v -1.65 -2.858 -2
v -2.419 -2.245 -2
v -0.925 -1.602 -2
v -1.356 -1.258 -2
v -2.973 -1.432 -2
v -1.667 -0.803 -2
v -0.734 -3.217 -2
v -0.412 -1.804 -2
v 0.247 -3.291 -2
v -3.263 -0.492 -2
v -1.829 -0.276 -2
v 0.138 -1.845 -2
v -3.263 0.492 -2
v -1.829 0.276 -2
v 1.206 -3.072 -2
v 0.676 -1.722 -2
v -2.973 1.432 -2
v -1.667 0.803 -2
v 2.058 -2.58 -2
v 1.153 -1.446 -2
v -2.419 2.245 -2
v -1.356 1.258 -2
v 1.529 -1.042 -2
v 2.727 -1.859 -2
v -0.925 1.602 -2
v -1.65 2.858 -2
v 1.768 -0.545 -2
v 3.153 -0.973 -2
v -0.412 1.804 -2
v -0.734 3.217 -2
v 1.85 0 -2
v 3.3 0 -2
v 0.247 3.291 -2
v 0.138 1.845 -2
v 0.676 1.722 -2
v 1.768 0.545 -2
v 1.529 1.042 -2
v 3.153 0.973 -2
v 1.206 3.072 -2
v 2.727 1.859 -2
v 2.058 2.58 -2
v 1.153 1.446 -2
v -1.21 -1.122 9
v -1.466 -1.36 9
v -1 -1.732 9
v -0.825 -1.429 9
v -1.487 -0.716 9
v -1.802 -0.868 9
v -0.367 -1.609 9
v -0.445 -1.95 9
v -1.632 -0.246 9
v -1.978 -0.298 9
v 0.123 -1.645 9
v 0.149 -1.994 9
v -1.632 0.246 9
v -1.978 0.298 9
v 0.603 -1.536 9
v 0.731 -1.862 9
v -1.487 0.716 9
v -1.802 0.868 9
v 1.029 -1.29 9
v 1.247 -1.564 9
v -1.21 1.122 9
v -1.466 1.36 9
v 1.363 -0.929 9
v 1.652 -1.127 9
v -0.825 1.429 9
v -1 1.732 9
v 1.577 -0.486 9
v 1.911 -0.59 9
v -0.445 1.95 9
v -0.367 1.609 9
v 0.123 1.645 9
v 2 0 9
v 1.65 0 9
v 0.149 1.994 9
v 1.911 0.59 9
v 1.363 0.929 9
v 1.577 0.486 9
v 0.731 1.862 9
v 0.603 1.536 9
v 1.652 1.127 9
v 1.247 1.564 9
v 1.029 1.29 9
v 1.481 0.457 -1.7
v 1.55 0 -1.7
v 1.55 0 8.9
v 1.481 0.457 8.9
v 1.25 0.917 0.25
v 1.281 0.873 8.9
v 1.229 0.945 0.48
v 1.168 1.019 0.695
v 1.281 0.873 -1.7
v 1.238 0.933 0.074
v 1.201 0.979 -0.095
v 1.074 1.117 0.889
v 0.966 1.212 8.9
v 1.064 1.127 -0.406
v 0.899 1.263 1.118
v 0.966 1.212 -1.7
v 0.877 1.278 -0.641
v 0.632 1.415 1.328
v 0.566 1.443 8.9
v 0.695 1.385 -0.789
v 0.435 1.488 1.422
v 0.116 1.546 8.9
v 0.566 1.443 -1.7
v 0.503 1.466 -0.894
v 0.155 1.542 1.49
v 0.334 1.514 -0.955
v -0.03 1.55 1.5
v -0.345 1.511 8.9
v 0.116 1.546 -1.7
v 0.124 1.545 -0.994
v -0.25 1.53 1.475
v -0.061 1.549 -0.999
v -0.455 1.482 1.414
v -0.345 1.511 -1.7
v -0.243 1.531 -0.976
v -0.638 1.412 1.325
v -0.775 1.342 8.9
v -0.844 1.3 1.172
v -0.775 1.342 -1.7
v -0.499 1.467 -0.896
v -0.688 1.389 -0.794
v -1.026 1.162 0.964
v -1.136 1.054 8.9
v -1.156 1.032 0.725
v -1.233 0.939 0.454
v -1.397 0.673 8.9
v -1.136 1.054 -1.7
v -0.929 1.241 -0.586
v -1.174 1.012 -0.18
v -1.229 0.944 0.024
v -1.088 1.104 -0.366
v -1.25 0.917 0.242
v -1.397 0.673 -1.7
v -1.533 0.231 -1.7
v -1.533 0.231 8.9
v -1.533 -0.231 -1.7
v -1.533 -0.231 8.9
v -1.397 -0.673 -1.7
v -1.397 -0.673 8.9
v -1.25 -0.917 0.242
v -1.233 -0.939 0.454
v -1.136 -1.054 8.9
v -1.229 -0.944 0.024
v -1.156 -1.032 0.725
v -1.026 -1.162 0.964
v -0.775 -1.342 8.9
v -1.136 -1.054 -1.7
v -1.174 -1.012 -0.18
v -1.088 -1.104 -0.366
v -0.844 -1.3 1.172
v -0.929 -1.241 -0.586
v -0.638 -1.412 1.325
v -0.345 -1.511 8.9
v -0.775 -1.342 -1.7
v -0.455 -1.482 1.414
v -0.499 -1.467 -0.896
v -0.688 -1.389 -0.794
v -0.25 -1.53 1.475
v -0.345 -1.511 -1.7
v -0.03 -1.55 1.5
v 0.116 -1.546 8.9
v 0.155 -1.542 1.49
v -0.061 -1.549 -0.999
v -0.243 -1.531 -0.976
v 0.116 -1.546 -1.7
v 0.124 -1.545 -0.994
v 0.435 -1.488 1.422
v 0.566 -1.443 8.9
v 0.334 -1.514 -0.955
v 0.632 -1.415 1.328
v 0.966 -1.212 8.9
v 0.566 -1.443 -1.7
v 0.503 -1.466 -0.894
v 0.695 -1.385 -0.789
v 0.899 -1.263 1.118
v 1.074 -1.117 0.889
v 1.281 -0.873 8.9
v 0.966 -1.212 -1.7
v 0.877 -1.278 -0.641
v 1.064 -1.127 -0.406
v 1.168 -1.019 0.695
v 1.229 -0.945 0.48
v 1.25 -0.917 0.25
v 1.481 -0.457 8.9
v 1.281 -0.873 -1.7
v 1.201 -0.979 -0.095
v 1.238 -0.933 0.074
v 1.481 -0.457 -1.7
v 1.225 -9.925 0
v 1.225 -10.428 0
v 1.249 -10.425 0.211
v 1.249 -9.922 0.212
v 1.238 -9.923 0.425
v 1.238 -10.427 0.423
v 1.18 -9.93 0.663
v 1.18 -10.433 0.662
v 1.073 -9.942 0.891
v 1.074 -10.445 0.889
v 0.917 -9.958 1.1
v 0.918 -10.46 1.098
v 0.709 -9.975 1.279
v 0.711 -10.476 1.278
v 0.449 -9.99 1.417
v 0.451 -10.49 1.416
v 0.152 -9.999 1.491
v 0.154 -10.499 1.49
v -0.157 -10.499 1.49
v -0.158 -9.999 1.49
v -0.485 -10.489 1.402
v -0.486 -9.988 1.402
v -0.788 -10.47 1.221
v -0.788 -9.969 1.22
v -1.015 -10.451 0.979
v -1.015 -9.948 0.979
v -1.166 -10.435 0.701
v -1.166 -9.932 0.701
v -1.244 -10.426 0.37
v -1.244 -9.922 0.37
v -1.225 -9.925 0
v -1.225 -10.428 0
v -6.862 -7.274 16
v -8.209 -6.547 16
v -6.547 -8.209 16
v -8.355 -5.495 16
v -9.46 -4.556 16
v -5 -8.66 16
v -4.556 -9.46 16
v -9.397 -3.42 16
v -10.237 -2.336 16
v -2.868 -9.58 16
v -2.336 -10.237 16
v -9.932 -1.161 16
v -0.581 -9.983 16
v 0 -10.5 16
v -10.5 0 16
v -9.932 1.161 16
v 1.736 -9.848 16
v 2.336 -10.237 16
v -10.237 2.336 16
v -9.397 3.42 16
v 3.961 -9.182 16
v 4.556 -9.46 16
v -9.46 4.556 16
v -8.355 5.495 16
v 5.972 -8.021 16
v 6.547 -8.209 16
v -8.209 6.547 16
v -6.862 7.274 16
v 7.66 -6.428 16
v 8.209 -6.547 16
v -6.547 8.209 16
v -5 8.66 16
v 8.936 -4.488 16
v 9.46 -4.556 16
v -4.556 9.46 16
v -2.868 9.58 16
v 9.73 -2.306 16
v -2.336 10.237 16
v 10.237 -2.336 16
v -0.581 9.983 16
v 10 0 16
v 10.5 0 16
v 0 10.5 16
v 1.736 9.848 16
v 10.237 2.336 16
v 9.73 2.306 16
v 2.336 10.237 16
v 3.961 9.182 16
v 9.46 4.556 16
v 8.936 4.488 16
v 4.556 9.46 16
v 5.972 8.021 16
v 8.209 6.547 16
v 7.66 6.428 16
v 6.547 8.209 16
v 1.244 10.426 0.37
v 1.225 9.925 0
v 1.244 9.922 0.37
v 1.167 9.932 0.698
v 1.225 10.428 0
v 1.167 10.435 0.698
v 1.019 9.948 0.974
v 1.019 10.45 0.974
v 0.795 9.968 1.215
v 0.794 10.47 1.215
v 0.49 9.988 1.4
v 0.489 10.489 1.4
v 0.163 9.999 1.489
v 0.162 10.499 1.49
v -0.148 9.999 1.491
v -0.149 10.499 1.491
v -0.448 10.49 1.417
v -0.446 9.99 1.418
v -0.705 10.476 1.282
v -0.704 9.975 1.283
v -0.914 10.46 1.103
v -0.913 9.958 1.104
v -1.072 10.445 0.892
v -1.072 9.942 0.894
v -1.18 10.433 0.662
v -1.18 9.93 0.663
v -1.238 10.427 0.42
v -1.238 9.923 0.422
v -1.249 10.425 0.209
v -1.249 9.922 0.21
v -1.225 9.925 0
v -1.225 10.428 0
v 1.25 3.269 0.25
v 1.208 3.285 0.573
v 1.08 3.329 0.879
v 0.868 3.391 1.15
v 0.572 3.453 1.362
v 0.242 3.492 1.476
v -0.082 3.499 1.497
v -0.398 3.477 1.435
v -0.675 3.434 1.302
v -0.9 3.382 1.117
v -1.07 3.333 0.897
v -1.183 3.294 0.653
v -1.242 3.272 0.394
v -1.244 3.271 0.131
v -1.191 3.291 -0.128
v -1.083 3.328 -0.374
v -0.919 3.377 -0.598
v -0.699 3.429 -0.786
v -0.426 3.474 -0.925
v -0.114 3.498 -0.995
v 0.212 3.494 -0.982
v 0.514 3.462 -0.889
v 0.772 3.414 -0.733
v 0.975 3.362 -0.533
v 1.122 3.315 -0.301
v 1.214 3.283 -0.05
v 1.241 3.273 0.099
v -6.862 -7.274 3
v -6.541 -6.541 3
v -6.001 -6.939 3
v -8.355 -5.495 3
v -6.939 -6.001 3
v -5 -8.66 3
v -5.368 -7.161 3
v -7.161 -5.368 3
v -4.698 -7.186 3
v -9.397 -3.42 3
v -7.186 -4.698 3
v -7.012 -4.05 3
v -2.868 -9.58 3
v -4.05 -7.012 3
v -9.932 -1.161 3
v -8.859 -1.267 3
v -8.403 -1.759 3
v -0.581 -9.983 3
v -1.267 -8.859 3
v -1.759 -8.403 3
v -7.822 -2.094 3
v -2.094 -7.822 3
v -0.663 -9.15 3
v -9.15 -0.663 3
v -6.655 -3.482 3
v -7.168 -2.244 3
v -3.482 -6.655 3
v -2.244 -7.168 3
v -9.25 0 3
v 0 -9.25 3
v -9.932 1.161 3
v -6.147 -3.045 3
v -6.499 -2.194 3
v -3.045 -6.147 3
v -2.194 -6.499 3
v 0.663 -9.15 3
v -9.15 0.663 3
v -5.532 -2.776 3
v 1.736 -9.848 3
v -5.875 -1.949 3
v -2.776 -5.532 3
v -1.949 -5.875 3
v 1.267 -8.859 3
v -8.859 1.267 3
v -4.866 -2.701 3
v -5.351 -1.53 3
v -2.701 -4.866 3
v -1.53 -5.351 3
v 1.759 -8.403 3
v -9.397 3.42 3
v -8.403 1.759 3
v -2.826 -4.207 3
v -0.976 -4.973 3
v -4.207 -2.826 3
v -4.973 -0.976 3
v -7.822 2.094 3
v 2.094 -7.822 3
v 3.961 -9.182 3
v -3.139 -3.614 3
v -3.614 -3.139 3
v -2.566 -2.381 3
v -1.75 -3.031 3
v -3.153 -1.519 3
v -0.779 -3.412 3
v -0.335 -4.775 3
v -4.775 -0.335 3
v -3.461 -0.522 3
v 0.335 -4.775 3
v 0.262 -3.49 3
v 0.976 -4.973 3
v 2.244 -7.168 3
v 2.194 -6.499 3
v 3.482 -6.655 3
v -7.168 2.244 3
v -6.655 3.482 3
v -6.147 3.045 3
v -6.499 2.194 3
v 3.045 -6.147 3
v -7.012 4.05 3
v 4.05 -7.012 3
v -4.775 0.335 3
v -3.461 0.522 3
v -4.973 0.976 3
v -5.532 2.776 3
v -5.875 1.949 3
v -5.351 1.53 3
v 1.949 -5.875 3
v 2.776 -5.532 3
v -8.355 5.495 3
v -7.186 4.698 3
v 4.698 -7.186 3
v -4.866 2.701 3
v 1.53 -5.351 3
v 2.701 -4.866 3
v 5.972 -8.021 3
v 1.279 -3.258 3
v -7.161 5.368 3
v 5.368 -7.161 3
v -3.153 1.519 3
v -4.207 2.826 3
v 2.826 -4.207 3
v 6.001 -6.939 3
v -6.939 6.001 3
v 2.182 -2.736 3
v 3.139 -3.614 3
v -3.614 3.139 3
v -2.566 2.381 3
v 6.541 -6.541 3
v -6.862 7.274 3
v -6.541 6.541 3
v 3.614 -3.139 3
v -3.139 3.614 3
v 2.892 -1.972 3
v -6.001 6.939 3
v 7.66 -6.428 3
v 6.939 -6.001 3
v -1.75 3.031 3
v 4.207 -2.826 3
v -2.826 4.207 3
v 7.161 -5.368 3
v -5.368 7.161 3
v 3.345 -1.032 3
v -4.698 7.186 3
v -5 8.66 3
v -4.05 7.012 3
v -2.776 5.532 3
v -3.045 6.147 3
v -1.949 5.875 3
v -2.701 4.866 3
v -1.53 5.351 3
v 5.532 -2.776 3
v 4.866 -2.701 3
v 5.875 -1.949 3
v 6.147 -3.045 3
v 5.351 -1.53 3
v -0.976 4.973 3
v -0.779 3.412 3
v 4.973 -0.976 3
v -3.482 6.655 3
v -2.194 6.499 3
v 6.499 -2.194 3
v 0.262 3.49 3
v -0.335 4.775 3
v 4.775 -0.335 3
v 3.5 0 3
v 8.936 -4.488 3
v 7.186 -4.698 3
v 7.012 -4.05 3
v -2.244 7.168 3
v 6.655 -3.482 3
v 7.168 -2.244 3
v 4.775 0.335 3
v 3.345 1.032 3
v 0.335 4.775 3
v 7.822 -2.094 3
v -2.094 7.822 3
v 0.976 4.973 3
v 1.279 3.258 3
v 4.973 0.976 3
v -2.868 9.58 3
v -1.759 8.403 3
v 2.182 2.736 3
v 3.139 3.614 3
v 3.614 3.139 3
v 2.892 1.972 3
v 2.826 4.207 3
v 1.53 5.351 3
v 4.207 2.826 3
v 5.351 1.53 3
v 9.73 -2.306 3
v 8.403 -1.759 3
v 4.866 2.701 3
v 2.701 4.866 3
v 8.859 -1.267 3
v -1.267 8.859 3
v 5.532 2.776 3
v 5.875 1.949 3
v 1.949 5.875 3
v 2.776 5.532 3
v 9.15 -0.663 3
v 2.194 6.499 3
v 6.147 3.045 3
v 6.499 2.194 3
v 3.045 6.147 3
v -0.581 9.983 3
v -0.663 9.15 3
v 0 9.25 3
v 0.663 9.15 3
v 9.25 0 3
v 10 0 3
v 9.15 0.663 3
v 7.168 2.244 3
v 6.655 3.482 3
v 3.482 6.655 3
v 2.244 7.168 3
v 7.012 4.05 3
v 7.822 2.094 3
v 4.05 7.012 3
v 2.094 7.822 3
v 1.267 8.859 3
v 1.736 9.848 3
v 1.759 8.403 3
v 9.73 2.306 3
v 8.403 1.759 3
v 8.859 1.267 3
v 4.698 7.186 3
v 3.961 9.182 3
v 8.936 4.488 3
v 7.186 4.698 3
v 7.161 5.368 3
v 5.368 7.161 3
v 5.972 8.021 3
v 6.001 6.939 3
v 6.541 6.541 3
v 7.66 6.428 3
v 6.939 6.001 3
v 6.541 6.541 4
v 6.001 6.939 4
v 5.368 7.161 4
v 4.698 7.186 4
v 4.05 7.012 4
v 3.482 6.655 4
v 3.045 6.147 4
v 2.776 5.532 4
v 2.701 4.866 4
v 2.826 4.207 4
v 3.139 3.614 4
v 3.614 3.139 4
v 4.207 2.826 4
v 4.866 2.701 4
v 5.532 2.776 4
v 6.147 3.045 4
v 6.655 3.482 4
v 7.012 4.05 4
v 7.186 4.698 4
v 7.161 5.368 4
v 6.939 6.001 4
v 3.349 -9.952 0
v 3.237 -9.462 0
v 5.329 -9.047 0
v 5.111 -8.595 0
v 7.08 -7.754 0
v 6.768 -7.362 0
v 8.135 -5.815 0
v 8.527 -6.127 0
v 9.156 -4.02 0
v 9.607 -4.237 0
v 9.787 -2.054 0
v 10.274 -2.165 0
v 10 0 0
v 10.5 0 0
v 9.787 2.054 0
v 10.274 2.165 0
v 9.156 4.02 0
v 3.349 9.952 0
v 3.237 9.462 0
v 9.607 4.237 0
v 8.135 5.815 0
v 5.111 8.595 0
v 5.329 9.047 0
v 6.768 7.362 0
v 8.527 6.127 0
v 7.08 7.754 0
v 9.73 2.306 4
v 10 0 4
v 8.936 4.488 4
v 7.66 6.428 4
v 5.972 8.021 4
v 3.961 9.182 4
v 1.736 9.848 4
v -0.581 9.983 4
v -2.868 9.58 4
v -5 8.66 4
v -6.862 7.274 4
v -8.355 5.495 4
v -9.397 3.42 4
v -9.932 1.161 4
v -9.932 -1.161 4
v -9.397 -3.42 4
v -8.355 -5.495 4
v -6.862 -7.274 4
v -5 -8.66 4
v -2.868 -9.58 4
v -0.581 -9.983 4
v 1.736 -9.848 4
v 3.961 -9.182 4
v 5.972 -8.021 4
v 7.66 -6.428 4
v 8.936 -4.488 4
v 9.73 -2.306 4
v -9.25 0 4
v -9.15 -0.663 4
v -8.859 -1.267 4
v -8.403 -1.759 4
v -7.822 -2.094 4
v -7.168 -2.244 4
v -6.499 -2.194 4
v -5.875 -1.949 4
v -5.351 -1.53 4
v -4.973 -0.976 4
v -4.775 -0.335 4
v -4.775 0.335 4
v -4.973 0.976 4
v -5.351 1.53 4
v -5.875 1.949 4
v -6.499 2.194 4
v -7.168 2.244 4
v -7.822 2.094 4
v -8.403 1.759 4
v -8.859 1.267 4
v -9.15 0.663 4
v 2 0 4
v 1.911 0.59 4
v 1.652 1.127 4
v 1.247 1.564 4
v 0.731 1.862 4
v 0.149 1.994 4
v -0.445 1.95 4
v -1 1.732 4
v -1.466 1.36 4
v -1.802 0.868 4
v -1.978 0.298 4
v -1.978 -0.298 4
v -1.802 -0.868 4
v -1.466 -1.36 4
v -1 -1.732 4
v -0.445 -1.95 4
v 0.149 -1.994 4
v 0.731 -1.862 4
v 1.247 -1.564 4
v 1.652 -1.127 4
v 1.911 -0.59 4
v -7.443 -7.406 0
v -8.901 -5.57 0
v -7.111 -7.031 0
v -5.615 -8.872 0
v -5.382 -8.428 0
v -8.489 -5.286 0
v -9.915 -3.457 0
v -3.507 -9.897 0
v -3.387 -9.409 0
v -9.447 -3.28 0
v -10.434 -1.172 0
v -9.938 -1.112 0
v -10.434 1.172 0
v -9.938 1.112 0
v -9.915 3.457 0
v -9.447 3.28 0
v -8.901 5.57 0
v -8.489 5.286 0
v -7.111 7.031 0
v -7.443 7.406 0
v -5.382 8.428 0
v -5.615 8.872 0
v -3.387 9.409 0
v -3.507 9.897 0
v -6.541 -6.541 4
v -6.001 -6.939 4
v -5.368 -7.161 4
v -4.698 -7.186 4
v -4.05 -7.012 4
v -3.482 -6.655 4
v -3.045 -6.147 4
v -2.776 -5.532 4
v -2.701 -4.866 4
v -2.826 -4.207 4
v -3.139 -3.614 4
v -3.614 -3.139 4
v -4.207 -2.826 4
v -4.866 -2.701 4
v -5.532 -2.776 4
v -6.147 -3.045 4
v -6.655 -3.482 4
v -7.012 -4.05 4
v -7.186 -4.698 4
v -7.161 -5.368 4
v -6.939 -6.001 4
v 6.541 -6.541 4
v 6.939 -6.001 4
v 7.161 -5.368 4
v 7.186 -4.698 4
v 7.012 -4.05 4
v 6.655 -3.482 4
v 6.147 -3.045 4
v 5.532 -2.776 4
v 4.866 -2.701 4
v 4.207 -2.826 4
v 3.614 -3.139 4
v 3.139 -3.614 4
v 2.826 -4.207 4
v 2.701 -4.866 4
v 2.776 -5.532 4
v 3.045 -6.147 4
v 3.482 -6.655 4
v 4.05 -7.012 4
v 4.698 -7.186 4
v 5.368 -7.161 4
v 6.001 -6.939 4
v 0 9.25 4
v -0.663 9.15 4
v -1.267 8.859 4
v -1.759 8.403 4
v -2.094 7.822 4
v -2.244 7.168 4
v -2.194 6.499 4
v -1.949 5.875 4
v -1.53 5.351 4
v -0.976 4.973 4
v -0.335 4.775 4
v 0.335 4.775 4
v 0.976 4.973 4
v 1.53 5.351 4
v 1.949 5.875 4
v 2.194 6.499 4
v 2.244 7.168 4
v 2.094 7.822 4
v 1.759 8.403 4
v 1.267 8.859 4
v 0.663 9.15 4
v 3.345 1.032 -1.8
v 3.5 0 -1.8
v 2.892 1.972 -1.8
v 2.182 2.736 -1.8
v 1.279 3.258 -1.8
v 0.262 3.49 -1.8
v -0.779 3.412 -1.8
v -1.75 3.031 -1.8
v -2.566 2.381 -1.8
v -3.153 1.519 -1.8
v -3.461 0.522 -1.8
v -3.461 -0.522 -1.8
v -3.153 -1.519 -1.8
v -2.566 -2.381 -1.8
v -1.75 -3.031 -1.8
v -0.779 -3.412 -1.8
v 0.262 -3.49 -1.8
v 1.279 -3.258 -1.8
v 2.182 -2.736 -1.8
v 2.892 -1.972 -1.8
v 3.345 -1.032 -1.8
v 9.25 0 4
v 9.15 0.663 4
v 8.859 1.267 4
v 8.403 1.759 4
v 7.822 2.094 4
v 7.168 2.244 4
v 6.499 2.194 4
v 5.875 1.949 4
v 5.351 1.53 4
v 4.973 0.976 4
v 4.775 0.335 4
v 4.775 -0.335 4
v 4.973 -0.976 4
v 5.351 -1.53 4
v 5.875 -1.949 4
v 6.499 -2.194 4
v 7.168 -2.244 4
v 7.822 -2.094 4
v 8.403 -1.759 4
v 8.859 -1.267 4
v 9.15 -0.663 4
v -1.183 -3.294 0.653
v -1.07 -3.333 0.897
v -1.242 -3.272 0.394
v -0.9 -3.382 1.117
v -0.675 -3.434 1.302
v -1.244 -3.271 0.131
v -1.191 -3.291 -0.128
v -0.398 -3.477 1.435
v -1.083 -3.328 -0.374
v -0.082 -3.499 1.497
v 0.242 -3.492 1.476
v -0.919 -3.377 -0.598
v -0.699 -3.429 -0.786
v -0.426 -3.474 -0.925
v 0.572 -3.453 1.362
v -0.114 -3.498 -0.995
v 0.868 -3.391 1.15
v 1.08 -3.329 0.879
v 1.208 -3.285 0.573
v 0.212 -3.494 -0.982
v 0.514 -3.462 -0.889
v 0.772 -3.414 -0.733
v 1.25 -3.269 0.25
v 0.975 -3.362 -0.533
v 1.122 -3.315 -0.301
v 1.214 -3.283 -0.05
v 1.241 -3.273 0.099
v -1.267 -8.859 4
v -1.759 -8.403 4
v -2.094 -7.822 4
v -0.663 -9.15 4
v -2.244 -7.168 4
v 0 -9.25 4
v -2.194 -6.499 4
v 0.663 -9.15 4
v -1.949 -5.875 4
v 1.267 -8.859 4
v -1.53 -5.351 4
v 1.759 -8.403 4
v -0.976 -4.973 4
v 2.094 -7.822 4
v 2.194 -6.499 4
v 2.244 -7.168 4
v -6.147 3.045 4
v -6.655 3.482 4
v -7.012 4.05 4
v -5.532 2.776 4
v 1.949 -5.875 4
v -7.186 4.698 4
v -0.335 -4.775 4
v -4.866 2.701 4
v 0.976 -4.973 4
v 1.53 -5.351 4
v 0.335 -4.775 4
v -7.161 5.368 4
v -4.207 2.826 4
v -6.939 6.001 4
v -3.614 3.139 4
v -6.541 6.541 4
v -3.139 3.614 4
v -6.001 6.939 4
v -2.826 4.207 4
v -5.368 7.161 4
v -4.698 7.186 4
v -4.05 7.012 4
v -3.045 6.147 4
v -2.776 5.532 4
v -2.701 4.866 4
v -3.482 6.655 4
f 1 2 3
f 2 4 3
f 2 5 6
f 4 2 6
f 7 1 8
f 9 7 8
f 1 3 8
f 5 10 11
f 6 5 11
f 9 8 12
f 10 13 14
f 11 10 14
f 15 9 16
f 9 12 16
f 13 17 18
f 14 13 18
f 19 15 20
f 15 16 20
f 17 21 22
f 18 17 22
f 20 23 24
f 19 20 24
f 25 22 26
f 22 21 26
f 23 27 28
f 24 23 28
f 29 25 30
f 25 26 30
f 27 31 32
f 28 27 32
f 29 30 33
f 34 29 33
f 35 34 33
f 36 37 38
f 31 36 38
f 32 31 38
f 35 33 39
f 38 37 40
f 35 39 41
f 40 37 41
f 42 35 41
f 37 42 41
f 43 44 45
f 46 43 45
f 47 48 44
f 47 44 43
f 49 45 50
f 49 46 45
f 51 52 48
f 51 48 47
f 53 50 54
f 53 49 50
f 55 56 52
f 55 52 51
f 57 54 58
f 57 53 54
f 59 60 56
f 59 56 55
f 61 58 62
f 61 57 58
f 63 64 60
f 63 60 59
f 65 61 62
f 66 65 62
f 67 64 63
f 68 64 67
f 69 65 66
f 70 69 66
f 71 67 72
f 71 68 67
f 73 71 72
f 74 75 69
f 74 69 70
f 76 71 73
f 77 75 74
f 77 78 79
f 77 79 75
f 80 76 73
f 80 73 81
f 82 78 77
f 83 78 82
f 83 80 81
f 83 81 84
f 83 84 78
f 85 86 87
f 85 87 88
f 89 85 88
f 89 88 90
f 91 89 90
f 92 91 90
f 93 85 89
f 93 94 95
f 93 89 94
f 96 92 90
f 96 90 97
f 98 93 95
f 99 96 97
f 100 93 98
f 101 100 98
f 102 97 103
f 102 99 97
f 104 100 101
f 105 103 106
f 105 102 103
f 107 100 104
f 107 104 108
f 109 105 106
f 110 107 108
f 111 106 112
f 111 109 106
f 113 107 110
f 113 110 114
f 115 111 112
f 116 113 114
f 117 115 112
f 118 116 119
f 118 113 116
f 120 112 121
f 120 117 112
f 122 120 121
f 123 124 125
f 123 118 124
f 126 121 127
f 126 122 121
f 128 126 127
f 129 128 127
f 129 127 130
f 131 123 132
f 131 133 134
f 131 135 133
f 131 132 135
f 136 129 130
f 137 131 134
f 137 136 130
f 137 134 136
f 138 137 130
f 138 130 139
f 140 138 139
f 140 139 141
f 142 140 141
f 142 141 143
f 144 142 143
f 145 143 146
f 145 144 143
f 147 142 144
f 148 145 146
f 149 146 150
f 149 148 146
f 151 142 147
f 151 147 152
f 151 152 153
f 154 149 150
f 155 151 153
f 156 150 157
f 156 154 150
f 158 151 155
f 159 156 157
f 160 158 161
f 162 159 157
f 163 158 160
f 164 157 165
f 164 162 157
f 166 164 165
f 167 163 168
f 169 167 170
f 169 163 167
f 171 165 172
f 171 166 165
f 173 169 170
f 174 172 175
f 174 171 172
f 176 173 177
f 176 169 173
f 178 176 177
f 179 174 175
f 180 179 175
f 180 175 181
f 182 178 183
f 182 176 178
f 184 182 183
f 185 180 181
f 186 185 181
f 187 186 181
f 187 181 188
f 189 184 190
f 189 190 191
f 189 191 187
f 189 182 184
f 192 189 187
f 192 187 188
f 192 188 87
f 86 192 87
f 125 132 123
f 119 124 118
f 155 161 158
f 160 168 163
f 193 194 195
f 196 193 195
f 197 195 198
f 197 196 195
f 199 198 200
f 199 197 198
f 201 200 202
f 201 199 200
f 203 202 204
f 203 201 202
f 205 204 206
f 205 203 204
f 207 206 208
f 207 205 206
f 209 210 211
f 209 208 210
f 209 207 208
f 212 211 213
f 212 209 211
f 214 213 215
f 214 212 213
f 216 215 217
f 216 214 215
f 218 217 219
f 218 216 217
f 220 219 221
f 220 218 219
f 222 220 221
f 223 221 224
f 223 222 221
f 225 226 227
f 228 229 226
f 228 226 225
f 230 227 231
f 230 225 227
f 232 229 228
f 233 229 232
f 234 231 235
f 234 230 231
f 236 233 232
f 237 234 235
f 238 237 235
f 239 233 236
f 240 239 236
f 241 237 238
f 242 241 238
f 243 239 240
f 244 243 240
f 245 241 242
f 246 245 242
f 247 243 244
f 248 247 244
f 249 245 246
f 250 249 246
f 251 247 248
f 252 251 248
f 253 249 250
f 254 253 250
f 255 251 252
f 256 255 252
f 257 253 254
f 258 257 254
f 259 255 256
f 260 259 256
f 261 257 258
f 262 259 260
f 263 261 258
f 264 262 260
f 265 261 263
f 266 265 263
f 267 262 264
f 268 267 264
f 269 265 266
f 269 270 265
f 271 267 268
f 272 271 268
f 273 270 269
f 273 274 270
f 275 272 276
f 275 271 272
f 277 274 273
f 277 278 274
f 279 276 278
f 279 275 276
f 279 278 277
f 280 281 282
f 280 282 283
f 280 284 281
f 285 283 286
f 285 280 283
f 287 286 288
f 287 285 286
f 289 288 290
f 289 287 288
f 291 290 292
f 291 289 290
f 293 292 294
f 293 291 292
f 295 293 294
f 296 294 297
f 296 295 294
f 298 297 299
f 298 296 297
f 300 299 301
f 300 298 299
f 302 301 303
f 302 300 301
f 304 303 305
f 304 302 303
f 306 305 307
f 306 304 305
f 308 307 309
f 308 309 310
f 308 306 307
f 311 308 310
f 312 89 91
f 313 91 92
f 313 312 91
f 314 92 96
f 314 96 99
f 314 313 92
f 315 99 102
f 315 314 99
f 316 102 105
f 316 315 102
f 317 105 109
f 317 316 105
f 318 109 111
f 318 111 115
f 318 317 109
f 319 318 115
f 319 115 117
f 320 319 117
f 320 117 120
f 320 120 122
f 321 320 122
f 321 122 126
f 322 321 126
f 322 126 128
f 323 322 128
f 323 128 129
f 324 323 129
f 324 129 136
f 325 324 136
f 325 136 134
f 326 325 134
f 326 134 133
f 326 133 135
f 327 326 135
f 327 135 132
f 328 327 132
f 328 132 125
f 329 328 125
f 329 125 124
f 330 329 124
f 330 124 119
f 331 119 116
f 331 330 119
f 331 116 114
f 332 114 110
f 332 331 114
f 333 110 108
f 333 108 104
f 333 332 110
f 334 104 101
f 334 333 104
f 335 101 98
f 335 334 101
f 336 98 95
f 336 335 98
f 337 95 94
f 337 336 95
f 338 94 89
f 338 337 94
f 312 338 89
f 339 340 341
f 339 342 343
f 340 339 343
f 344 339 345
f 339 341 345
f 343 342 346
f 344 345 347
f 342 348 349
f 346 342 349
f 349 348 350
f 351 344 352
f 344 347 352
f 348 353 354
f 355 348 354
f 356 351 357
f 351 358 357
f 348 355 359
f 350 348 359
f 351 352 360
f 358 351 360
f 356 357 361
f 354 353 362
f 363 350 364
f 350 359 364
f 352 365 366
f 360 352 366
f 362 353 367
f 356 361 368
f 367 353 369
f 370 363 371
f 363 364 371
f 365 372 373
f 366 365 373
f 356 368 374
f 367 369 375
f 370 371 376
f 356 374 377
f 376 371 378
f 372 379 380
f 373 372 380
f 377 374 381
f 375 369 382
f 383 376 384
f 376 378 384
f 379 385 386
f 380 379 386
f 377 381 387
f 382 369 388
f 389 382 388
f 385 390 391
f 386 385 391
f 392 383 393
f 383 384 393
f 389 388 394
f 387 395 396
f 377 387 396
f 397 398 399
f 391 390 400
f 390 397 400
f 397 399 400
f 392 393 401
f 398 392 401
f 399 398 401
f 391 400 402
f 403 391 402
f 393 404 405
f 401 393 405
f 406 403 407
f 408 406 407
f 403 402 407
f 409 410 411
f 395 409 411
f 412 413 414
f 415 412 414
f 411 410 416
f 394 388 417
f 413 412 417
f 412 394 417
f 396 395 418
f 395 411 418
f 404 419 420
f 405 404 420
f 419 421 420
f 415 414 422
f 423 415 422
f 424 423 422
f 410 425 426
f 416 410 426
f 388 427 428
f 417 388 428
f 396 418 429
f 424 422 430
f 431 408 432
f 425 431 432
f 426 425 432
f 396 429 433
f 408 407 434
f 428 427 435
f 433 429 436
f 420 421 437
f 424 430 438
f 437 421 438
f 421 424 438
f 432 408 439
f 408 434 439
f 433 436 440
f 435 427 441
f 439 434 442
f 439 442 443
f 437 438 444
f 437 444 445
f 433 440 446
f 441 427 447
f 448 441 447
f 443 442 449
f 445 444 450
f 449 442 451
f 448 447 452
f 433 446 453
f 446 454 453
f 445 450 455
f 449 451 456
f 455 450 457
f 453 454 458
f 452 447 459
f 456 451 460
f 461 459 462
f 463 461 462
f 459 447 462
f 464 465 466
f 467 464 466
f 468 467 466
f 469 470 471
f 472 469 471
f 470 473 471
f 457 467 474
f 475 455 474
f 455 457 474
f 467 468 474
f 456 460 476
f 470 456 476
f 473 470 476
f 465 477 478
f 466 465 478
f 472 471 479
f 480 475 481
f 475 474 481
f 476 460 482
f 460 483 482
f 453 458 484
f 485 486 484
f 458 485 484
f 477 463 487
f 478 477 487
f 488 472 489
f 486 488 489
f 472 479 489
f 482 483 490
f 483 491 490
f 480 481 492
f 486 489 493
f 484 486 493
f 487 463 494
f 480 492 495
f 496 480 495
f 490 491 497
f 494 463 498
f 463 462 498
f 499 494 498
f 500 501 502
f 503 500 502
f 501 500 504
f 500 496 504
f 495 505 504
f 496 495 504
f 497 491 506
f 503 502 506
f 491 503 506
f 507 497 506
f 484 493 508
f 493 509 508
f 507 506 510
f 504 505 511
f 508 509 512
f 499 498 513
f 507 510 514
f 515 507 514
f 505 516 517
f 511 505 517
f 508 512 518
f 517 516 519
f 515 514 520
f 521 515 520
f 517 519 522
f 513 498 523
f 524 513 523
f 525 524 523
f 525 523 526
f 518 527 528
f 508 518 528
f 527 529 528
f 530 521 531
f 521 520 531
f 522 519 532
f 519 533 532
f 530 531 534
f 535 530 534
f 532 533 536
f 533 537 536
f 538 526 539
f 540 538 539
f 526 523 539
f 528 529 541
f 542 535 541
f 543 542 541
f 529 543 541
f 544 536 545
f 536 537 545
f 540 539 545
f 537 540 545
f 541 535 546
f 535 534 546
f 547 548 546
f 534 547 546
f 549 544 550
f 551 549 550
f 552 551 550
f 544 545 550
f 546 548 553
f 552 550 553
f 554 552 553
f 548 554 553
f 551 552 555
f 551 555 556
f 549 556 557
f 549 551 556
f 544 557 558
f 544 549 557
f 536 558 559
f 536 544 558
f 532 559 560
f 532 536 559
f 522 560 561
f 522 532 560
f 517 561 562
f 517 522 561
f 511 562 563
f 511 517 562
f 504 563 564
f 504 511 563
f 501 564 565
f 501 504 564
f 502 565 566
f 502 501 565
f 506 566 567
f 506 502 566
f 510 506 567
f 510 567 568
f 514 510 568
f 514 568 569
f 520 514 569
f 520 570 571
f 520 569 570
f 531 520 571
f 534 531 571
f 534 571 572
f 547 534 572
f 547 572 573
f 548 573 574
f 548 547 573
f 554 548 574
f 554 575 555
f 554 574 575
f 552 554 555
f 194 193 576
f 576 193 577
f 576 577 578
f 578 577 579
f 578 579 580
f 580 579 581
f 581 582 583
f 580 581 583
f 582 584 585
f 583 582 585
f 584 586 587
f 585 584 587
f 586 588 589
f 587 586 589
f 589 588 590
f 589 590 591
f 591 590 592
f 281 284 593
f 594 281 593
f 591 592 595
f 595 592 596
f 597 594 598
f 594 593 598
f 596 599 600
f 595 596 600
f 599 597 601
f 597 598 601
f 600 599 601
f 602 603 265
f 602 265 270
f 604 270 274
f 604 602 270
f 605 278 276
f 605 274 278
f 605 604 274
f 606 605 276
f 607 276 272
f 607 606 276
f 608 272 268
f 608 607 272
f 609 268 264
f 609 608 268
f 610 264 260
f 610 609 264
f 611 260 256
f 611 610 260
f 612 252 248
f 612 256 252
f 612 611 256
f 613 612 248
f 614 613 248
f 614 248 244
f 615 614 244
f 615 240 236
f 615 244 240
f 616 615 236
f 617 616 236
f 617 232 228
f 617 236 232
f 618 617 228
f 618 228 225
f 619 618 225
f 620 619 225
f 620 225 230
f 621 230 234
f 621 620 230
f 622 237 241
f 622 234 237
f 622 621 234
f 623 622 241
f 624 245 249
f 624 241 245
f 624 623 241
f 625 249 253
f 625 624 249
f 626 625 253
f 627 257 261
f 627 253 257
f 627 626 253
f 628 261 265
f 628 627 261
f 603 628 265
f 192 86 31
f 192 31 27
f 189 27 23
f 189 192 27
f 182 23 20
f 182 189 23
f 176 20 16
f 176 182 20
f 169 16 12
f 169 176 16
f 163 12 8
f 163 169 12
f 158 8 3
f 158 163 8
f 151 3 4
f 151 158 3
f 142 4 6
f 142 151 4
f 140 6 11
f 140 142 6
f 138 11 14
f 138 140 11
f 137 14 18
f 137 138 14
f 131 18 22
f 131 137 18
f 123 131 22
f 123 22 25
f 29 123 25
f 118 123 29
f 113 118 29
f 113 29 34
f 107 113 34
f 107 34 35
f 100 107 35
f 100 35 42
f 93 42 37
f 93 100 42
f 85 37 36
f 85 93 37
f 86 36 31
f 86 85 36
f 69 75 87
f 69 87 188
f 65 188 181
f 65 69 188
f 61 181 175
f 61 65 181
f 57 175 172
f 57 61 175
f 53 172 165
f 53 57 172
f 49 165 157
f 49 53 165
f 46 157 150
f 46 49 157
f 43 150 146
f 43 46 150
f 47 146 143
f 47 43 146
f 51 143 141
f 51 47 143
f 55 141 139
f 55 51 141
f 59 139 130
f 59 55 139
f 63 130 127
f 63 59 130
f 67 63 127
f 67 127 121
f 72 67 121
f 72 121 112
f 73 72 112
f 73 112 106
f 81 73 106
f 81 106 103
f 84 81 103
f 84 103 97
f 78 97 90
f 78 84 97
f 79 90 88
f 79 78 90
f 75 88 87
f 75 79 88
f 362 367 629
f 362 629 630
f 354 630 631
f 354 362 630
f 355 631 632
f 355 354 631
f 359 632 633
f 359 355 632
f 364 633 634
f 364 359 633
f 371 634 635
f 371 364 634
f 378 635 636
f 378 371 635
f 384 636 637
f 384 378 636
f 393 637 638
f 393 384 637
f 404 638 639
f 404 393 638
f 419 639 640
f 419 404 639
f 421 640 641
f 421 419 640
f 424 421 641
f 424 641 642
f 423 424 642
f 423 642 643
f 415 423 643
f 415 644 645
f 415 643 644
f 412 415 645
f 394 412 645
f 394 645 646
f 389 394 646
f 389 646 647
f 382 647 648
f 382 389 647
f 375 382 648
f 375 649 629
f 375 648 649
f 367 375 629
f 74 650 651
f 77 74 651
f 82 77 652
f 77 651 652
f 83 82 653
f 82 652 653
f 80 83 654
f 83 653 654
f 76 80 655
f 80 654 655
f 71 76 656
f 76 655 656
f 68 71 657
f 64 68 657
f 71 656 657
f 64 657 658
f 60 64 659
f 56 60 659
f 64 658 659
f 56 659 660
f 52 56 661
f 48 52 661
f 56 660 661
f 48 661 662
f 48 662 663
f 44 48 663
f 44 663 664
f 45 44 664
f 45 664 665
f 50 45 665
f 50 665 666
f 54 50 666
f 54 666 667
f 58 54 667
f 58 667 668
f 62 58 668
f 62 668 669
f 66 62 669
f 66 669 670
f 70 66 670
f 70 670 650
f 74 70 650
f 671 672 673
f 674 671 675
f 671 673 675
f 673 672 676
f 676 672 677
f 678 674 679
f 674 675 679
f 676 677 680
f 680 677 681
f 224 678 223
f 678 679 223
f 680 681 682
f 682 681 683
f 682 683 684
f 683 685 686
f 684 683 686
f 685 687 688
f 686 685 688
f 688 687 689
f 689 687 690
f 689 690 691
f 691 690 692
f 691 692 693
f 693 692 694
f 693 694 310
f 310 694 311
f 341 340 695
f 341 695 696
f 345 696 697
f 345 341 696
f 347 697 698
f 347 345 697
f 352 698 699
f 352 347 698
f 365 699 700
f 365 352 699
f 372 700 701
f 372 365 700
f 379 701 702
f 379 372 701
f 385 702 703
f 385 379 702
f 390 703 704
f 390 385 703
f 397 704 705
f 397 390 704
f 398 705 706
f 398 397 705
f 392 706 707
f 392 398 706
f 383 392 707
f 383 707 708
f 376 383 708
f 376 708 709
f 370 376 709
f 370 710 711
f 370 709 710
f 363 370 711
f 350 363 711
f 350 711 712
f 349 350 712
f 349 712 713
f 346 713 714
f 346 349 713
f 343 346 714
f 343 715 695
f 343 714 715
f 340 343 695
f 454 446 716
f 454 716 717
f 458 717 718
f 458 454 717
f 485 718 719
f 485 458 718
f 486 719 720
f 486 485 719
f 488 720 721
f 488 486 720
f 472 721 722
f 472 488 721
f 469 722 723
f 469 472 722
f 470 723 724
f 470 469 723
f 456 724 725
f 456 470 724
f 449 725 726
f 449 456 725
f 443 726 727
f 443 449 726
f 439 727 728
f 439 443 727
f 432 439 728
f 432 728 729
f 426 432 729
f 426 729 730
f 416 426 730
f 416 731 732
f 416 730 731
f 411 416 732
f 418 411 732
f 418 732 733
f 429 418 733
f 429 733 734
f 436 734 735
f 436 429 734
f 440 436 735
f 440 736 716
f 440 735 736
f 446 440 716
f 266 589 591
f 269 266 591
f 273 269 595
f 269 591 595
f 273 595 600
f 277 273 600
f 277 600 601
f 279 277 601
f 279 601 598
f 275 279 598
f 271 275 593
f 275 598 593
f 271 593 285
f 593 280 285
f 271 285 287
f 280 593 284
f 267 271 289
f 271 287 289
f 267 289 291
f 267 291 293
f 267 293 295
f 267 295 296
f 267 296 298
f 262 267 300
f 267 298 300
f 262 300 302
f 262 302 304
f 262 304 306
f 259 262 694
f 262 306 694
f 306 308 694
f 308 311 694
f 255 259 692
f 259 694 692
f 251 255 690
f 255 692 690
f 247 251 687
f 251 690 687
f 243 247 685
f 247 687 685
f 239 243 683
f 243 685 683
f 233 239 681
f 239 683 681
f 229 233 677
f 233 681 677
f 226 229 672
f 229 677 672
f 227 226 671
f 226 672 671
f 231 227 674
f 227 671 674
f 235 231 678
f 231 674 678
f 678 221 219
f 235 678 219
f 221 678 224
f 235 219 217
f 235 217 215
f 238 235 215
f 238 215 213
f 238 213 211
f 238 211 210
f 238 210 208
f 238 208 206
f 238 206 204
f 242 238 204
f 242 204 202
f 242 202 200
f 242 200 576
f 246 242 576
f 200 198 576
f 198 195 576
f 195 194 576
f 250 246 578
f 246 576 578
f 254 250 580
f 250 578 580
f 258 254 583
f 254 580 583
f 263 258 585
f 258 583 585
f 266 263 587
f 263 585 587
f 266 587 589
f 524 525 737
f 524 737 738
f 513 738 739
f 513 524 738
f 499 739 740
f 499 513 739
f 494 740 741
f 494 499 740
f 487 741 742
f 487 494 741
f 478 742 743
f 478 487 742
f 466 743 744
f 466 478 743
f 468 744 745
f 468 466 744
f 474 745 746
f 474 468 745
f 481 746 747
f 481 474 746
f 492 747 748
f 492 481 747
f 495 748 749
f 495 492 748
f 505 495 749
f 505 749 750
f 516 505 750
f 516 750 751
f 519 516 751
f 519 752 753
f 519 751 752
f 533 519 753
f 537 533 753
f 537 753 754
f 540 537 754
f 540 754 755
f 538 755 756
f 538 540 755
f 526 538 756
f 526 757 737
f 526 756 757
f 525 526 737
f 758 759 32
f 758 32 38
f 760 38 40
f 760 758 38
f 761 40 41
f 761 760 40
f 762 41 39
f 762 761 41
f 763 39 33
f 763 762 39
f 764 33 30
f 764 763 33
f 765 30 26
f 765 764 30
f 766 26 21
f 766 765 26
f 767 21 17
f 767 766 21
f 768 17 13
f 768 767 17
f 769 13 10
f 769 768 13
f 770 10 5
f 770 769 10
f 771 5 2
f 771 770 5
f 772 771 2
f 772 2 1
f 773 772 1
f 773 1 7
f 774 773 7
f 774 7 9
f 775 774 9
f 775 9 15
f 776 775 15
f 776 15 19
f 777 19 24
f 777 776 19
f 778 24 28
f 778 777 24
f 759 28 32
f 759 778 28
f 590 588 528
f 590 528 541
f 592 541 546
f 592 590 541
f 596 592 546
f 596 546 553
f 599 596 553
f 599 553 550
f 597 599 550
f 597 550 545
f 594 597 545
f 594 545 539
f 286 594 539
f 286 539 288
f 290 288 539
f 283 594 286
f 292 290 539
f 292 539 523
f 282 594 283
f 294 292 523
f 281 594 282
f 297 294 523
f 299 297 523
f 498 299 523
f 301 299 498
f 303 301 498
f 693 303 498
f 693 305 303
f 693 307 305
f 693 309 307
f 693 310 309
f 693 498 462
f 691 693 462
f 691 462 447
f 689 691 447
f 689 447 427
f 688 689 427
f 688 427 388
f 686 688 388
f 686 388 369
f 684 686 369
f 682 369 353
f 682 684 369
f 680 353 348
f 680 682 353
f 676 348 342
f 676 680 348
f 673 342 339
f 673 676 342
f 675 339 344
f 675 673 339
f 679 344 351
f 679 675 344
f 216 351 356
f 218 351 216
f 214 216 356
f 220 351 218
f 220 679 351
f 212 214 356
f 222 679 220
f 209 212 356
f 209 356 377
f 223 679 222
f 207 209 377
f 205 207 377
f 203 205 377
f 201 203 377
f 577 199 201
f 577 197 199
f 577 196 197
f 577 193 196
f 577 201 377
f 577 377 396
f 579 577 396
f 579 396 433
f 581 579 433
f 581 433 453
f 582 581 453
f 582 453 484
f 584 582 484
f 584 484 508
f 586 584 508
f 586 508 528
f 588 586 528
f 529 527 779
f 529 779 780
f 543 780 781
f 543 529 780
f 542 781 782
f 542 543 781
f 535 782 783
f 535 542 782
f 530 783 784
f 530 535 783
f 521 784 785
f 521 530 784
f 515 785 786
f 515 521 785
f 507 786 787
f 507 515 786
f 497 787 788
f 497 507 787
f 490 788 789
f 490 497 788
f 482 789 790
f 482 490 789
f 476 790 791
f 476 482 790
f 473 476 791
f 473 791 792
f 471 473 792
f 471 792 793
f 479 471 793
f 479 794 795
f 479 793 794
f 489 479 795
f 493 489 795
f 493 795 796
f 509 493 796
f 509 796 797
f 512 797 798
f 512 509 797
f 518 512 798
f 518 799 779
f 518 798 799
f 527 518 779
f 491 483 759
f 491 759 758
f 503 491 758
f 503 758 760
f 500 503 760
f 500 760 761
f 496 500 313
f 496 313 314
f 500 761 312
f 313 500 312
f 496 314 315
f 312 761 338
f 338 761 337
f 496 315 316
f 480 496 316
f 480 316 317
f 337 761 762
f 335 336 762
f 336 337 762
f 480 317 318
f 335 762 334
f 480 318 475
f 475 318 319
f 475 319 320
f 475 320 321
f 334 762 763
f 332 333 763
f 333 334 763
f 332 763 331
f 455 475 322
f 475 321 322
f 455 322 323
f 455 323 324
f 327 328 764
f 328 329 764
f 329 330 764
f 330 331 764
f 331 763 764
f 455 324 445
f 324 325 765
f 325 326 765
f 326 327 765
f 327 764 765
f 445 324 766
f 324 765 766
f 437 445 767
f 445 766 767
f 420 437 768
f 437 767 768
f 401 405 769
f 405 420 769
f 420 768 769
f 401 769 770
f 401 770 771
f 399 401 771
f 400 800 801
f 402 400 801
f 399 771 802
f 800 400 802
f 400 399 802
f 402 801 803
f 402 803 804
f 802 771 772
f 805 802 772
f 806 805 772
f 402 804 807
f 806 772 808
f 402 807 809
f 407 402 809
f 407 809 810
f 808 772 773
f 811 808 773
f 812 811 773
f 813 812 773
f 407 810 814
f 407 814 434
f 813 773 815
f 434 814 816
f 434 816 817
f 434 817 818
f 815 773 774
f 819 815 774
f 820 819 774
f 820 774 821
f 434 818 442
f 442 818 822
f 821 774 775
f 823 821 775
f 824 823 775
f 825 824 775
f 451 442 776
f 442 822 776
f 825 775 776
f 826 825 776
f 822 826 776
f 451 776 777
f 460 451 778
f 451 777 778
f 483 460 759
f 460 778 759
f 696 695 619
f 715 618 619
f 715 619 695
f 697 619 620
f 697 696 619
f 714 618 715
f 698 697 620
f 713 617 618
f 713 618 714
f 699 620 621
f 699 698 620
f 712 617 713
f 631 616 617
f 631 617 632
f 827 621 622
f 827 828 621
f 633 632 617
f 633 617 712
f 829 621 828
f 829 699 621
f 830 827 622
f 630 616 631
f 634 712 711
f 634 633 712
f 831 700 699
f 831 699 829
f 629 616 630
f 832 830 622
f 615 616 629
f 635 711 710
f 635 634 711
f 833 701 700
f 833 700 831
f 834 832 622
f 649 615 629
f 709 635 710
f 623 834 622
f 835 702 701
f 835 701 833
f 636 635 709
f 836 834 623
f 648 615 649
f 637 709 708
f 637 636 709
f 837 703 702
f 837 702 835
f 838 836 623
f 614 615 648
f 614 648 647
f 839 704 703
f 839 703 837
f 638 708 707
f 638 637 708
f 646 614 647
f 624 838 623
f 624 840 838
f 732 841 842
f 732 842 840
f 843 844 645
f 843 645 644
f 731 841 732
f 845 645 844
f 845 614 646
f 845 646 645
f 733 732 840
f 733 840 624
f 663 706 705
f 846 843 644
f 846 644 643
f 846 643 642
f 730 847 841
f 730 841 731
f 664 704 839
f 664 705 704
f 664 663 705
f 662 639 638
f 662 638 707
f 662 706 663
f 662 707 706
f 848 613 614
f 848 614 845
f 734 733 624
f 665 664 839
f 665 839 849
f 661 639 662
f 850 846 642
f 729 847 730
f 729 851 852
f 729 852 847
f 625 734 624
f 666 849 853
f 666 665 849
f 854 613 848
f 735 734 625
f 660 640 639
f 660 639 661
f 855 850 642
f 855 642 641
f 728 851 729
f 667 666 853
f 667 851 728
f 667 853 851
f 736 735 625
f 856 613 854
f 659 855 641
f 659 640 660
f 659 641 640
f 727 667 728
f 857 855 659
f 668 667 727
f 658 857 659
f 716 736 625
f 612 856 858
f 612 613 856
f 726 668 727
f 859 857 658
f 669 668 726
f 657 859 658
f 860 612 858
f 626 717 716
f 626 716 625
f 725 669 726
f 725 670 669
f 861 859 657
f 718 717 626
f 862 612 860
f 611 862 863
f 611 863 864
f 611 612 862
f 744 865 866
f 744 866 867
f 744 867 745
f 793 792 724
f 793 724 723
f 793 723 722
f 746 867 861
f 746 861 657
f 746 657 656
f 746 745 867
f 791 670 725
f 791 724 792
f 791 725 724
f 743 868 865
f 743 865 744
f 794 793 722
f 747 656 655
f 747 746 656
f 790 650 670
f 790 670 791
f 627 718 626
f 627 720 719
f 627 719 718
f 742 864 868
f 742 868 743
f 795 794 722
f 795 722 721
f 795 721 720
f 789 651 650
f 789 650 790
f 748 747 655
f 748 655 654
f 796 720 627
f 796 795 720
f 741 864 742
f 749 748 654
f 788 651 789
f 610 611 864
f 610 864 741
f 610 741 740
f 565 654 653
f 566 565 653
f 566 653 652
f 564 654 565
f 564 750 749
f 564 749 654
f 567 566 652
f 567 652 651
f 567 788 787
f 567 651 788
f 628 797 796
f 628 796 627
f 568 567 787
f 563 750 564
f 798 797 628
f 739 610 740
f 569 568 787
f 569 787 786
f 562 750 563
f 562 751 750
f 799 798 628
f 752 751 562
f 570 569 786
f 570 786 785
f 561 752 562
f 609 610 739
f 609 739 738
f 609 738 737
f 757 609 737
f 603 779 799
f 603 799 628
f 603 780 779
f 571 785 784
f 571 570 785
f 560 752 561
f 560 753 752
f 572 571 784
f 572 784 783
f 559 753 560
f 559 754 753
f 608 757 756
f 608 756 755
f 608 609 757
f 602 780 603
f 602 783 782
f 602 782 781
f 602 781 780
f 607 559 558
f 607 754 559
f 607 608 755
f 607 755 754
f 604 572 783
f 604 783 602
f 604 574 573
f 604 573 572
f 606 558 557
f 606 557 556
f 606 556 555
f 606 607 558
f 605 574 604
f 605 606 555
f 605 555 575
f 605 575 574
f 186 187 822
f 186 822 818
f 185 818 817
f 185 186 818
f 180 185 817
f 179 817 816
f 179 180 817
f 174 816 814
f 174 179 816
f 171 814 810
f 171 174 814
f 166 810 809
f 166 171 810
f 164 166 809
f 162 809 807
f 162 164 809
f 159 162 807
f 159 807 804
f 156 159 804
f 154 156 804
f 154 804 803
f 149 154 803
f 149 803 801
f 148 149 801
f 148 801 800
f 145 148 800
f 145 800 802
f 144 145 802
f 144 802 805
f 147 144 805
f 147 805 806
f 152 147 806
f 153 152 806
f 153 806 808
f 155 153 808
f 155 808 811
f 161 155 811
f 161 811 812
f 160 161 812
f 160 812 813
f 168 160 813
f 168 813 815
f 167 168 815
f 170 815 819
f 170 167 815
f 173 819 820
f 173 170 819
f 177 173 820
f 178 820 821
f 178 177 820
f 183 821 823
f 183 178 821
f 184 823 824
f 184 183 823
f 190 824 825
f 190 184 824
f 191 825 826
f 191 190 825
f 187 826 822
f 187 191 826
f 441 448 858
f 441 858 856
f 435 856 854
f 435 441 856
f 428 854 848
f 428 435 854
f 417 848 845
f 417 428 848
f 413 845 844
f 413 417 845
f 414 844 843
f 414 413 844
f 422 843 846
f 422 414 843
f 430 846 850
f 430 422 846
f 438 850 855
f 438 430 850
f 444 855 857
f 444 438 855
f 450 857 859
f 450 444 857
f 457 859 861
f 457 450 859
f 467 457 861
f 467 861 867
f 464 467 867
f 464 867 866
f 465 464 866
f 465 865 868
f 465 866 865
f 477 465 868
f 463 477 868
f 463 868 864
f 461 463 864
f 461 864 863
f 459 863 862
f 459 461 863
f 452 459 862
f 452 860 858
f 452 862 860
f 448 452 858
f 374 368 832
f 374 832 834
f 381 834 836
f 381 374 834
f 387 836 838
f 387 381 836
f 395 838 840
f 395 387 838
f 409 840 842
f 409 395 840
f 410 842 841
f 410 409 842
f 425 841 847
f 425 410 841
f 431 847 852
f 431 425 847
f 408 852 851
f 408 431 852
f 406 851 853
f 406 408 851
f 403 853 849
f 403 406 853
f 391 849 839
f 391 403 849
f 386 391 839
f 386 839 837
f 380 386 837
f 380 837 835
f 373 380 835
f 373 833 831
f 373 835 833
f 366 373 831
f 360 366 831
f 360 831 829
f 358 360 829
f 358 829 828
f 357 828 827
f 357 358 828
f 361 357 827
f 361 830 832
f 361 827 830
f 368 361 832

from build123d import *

# Parameters (mm, degrees)
CYLINDER039_R          = 2.25
CYLINDER039_DEPTH      = 30
ARRAY002_COUNT         = 8
CYLINDER038_R          = 1.55
CYLINDER038_DEPTH      = 30
CYLINDER045_R          = 1.25
CYLINDER045_DEPTH      = 32
CYLINDER045_ROLL_ANGLE = 90
CYLINDER043_R          = 3.5
CYLINDER043_DEPTH      = 5.5
CYLINDER042_R          = 10
CYLINDER042_DEPTH      = 16
CYLINDER037_R          = 10
CYLINDER037_DEPTH      = 16
CYLINDER036_R          = 10.5
CYLINDER036_DEPTH      = 16
CYLINDER044_R          = 2
CYLINDER044_DEPTH      = 5.5
CHAMFER062_1_SIZE      = 0.3
CHAMFER062_2_SIZE      = 0.2
CHAMFER062_3_SIZE      = 0.1


with BuildPart() as array002:
    # Cylinder039 → Cylinder039 (new body)
    with BuildSketch(Plane(origin=(7, 0, -10), x_dir=(1, 0, 0), z_dir=(0, 0, 1))):
        Circle(CYLINDER039_R)
    extrude(amount=CYLINDER039_DEPTH)

    # Array002: Array002 ×8 about axis
    array002_axis = Axis((0, 0, 0), (0, 0, 1))


with BuildPart() as array002_1:
    add(array002.part)
    for i in range(1, ARRAY002_COUNT):
        add(array002.part.rotate(array002_axis, i * 360 / ARRAY002_COUNT))


with BuildPart() as fusion033:
    # Cylinder038 → Cylinder038 (new body)
    with BuildSketch(Plane.XY.offset(-10)):
        Circle(CYLINDER038_R)
    extrude(amount=CYLINDER038_DEPTH)

    # Fusion033: union Array002
    add(array002_1.part)


with BuildPart() as cylinder045:
    # Cylinder045 → Cylinder045 (new body)
    with BuildSketch(Plane.XY):
        Circle(CYLINDER045_R)
    extrude(amount=CYLINDER045_DEPTH)


with BuildPart() as cylinder045_1:
    # Cylinder045 roll: moved
    add(cylinder045.part.rotate(Axis((0, 0, 0), (1, 0, 0)), CYLINDER045_ROLL_ANGLE))


with BuildPart() as cylinder045_2:
    # Cylinder045 placement: moved
    add(cylinder045_1.part.moved(Location((0, 15, 0.25))))


with BuildPart() as cylinder043:
    # Cylinder043 → Cylinder043 (new body)
    with BuildSketch(Plane.XY.offset(-2)):
        Circle(CYLINDER043_R)
    extrude(amount=CYLINDER043_DEPTH)


with BuildPart() as cylinder042:
    # Cylinder042 → Cylinder042 (new body)
    with BuildSketch(Plane.XY.offset(-13)):
        Circle(CYLINDER042_R)
    extrude(amount=CYLINDER042_DEPTH)


with BuildPart() as fusion034:
    # Cylinder037 → Cylinder037 (new body)
    with BuildSketch(Plane.XY.offset(4)):
        Circle(CYLINDER037_R)
    extrude(amount=CYLINDER037_DEPTH)

    # Fusion034: union Cylinder042
    add(cylinder042.part)


with BuildPart() as cut028:
    # Cylinder036 → Cylinder036 (new body)
    with BuildSketch(Plane.XY):
        Circle(CYLINDER036_R)
    extrude(amount=CYLINDER036_DEPTH)

    # Cut028: cut Fusion034
    add(fusion034.part, mode=Mode.SUBTRACT)


with BuildPart() as chamfer062:
    # Cylinder044 → Cylinder044 (new body)
    with BuildSketch(Plane.XY.offset(3.5)):
        Circle(CYLINDER044_R)
    extrude(amount=CYLINDER044_DEPTH)

    # Fusion035: union Cylinder043, Cut028
    add(cylinder043.part)
    add(cut028.part)

    # Cut002: cut Cylinder045
    add(cylinder045_2.part, mode=Mode.SUBTRACT)

    # Cut029: cut Fusion033
    add(fusion033.part, mode=Mode.SUBTRACT)

    # Chamfer062 1
    chamfer062_1_edges = [chamfer062.edges().sort_by_distance(p)[0] for p in [
        (-1.55, 0, -2),
    ]]
    chamfer(chamfer062_1_edges, length=CHAMFER062_1_SIZE)

    # Chamfer062 2
    chamfer062_2_edges = [chamfer062.edges().sort_by_distance(p)[0] for p in [
        (-3.5, 0, -2),
    ]]
    chamfer(chamfer062_2_edges, length=CHAMFER062_2_SIZE)

    # Chamfer062 3
    chamfer062_3_edges = [chamfer062.edges().sort_by_distance(p)[0] for p in [
        (-1.55, 0, 9),
    ]]
    chamfer(chamfer062_3_edges, length=CHAMFER062_3_SIZE)


solid = chamfer062.part
